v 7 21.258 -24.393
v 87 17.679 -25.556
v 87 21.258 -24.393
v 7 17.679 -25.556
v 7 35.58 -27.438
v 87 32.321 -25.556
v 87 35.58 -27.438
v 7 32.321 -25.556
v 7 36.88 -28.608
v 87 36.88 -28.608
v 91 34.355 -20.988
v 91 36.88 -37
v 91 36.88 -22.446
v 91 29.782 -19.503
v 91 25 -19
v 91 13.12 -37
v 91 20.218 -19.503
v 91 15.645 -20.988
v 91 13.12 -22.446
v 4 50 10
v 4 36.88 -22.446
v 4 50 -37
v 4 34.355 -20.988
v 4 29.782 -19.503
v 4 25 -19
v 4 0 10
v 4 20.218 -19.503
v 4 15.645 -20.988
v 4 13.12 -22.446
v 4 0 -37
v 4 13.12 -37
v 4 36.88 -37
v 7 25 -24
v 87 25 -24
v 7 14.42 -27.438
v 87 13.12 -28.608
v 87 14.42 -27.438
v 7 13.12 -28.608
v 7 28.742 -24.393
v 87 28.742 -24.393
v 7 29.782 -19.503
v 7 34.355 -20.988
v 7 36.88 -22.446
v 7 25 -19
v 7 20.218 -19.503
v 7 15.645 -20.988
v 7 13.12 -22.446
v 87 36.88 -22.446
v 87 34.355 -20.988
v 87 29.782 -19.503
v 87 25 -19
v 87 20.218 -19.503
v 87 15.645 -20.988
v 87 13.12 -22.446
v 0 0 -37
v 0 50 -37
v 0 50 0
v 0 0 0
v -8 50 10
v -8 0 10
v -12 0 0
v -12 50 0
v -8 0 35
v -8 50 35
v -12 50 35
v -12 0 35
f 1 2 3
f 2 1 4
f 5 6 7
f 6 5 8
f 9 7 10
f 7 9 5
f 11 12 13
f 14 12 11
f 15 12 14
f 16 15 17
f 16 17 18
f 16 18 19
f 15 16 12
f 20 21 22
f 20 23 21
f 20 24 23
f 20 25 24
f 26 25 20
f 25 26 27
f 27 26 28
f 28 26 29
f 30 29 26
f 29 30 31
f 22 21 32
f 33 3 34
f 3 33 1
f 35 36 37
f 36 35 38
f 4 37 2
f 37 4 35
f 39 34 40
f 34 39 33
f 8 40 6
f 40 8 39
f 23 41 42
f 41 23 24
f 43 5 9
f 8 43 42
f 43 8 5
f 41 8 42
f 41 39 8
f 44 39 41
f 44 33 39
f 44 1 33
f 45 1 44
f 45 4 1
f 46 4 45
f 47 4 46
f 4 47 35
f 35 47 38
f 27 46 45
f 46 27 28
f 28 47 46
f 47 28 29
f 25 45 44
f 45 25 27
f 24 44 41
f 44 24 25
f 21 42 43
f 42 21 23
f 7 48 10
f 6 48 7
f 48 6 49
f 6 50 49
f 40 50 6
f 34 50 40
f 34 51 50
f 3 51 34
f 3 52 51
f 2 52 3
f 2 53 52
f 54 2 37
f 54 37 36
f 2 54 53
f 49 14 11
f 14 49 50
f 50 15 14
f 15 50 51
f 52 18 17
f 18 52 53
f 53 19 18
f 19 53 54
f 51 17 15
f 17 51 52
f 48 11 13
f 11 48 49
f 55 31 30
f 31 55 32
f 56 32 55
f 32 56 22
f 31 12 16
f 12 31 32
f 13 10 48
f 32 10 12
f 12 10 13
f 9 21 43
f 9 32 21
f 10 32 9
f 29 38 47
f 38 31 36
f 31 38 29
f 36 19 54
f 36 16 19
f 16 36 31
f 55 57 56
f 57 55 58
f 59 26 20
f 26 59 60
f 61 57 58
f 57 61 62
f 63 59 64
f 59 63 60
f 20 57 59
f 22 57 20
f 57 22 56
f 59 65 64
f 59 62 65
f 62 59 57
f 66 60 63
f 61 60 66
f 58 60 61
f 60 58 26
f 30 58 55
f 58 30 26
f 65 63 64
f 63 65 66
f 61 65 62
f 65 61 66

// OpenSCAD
// printed 50 3 56 60 3
// printed 36 3 80 66 4

// Size of the hole in the middle of the spool
Core_Diameter = 36; // [10:60]
 
// Position of the spool core relative to the holder
Core_Offset = 3; // [0:20]

// Depth of the spool core
Core_Depth = 80; // [10:100]

// How much of the core to print
Percentage = 66; // [10:100]

module dont_customize(){}

wall = 4;

notch_y = 50;
notch_z = 10;
notch_x = 8;

tab_z = 50-15;
tab_x = wall;

hang_z = 47;
hang_x = wall;

drop_z=42;

p1 = 50;
p2 = 50;

hang_d = Core_Diameter + 10;

translate([-notch_x,0,0]) cube([notch_x,notch_y,notch_z]);
translate([-notch_x-tab_x,0,0]) cube([tab_x,notch_y,tab_z]);
translate([0,0,-hang_z+notch_z]) cube([hang_x,notch_y,hang_z]);

translate([wall,notch_y/2,-drop_z]) rotate([0,90,0]) {
    intersection()
    {
        union()
        {
            cylinder(d=Core_Diameter,h=Core_Offset+Core_Depth+hang_x);
            translate([0,0,0]) cylinder(d=hang_d,h=Core_Offset);
            translate([0,0,Core_Offset+Core_Depth]) cylinder(d=hang_d,h=wall);
         }
        translate([-105,-Core_Diameter/100*Percentage/2,0]) cube([100,Core_Diameter/100*Percentage,200]);
    }
}

